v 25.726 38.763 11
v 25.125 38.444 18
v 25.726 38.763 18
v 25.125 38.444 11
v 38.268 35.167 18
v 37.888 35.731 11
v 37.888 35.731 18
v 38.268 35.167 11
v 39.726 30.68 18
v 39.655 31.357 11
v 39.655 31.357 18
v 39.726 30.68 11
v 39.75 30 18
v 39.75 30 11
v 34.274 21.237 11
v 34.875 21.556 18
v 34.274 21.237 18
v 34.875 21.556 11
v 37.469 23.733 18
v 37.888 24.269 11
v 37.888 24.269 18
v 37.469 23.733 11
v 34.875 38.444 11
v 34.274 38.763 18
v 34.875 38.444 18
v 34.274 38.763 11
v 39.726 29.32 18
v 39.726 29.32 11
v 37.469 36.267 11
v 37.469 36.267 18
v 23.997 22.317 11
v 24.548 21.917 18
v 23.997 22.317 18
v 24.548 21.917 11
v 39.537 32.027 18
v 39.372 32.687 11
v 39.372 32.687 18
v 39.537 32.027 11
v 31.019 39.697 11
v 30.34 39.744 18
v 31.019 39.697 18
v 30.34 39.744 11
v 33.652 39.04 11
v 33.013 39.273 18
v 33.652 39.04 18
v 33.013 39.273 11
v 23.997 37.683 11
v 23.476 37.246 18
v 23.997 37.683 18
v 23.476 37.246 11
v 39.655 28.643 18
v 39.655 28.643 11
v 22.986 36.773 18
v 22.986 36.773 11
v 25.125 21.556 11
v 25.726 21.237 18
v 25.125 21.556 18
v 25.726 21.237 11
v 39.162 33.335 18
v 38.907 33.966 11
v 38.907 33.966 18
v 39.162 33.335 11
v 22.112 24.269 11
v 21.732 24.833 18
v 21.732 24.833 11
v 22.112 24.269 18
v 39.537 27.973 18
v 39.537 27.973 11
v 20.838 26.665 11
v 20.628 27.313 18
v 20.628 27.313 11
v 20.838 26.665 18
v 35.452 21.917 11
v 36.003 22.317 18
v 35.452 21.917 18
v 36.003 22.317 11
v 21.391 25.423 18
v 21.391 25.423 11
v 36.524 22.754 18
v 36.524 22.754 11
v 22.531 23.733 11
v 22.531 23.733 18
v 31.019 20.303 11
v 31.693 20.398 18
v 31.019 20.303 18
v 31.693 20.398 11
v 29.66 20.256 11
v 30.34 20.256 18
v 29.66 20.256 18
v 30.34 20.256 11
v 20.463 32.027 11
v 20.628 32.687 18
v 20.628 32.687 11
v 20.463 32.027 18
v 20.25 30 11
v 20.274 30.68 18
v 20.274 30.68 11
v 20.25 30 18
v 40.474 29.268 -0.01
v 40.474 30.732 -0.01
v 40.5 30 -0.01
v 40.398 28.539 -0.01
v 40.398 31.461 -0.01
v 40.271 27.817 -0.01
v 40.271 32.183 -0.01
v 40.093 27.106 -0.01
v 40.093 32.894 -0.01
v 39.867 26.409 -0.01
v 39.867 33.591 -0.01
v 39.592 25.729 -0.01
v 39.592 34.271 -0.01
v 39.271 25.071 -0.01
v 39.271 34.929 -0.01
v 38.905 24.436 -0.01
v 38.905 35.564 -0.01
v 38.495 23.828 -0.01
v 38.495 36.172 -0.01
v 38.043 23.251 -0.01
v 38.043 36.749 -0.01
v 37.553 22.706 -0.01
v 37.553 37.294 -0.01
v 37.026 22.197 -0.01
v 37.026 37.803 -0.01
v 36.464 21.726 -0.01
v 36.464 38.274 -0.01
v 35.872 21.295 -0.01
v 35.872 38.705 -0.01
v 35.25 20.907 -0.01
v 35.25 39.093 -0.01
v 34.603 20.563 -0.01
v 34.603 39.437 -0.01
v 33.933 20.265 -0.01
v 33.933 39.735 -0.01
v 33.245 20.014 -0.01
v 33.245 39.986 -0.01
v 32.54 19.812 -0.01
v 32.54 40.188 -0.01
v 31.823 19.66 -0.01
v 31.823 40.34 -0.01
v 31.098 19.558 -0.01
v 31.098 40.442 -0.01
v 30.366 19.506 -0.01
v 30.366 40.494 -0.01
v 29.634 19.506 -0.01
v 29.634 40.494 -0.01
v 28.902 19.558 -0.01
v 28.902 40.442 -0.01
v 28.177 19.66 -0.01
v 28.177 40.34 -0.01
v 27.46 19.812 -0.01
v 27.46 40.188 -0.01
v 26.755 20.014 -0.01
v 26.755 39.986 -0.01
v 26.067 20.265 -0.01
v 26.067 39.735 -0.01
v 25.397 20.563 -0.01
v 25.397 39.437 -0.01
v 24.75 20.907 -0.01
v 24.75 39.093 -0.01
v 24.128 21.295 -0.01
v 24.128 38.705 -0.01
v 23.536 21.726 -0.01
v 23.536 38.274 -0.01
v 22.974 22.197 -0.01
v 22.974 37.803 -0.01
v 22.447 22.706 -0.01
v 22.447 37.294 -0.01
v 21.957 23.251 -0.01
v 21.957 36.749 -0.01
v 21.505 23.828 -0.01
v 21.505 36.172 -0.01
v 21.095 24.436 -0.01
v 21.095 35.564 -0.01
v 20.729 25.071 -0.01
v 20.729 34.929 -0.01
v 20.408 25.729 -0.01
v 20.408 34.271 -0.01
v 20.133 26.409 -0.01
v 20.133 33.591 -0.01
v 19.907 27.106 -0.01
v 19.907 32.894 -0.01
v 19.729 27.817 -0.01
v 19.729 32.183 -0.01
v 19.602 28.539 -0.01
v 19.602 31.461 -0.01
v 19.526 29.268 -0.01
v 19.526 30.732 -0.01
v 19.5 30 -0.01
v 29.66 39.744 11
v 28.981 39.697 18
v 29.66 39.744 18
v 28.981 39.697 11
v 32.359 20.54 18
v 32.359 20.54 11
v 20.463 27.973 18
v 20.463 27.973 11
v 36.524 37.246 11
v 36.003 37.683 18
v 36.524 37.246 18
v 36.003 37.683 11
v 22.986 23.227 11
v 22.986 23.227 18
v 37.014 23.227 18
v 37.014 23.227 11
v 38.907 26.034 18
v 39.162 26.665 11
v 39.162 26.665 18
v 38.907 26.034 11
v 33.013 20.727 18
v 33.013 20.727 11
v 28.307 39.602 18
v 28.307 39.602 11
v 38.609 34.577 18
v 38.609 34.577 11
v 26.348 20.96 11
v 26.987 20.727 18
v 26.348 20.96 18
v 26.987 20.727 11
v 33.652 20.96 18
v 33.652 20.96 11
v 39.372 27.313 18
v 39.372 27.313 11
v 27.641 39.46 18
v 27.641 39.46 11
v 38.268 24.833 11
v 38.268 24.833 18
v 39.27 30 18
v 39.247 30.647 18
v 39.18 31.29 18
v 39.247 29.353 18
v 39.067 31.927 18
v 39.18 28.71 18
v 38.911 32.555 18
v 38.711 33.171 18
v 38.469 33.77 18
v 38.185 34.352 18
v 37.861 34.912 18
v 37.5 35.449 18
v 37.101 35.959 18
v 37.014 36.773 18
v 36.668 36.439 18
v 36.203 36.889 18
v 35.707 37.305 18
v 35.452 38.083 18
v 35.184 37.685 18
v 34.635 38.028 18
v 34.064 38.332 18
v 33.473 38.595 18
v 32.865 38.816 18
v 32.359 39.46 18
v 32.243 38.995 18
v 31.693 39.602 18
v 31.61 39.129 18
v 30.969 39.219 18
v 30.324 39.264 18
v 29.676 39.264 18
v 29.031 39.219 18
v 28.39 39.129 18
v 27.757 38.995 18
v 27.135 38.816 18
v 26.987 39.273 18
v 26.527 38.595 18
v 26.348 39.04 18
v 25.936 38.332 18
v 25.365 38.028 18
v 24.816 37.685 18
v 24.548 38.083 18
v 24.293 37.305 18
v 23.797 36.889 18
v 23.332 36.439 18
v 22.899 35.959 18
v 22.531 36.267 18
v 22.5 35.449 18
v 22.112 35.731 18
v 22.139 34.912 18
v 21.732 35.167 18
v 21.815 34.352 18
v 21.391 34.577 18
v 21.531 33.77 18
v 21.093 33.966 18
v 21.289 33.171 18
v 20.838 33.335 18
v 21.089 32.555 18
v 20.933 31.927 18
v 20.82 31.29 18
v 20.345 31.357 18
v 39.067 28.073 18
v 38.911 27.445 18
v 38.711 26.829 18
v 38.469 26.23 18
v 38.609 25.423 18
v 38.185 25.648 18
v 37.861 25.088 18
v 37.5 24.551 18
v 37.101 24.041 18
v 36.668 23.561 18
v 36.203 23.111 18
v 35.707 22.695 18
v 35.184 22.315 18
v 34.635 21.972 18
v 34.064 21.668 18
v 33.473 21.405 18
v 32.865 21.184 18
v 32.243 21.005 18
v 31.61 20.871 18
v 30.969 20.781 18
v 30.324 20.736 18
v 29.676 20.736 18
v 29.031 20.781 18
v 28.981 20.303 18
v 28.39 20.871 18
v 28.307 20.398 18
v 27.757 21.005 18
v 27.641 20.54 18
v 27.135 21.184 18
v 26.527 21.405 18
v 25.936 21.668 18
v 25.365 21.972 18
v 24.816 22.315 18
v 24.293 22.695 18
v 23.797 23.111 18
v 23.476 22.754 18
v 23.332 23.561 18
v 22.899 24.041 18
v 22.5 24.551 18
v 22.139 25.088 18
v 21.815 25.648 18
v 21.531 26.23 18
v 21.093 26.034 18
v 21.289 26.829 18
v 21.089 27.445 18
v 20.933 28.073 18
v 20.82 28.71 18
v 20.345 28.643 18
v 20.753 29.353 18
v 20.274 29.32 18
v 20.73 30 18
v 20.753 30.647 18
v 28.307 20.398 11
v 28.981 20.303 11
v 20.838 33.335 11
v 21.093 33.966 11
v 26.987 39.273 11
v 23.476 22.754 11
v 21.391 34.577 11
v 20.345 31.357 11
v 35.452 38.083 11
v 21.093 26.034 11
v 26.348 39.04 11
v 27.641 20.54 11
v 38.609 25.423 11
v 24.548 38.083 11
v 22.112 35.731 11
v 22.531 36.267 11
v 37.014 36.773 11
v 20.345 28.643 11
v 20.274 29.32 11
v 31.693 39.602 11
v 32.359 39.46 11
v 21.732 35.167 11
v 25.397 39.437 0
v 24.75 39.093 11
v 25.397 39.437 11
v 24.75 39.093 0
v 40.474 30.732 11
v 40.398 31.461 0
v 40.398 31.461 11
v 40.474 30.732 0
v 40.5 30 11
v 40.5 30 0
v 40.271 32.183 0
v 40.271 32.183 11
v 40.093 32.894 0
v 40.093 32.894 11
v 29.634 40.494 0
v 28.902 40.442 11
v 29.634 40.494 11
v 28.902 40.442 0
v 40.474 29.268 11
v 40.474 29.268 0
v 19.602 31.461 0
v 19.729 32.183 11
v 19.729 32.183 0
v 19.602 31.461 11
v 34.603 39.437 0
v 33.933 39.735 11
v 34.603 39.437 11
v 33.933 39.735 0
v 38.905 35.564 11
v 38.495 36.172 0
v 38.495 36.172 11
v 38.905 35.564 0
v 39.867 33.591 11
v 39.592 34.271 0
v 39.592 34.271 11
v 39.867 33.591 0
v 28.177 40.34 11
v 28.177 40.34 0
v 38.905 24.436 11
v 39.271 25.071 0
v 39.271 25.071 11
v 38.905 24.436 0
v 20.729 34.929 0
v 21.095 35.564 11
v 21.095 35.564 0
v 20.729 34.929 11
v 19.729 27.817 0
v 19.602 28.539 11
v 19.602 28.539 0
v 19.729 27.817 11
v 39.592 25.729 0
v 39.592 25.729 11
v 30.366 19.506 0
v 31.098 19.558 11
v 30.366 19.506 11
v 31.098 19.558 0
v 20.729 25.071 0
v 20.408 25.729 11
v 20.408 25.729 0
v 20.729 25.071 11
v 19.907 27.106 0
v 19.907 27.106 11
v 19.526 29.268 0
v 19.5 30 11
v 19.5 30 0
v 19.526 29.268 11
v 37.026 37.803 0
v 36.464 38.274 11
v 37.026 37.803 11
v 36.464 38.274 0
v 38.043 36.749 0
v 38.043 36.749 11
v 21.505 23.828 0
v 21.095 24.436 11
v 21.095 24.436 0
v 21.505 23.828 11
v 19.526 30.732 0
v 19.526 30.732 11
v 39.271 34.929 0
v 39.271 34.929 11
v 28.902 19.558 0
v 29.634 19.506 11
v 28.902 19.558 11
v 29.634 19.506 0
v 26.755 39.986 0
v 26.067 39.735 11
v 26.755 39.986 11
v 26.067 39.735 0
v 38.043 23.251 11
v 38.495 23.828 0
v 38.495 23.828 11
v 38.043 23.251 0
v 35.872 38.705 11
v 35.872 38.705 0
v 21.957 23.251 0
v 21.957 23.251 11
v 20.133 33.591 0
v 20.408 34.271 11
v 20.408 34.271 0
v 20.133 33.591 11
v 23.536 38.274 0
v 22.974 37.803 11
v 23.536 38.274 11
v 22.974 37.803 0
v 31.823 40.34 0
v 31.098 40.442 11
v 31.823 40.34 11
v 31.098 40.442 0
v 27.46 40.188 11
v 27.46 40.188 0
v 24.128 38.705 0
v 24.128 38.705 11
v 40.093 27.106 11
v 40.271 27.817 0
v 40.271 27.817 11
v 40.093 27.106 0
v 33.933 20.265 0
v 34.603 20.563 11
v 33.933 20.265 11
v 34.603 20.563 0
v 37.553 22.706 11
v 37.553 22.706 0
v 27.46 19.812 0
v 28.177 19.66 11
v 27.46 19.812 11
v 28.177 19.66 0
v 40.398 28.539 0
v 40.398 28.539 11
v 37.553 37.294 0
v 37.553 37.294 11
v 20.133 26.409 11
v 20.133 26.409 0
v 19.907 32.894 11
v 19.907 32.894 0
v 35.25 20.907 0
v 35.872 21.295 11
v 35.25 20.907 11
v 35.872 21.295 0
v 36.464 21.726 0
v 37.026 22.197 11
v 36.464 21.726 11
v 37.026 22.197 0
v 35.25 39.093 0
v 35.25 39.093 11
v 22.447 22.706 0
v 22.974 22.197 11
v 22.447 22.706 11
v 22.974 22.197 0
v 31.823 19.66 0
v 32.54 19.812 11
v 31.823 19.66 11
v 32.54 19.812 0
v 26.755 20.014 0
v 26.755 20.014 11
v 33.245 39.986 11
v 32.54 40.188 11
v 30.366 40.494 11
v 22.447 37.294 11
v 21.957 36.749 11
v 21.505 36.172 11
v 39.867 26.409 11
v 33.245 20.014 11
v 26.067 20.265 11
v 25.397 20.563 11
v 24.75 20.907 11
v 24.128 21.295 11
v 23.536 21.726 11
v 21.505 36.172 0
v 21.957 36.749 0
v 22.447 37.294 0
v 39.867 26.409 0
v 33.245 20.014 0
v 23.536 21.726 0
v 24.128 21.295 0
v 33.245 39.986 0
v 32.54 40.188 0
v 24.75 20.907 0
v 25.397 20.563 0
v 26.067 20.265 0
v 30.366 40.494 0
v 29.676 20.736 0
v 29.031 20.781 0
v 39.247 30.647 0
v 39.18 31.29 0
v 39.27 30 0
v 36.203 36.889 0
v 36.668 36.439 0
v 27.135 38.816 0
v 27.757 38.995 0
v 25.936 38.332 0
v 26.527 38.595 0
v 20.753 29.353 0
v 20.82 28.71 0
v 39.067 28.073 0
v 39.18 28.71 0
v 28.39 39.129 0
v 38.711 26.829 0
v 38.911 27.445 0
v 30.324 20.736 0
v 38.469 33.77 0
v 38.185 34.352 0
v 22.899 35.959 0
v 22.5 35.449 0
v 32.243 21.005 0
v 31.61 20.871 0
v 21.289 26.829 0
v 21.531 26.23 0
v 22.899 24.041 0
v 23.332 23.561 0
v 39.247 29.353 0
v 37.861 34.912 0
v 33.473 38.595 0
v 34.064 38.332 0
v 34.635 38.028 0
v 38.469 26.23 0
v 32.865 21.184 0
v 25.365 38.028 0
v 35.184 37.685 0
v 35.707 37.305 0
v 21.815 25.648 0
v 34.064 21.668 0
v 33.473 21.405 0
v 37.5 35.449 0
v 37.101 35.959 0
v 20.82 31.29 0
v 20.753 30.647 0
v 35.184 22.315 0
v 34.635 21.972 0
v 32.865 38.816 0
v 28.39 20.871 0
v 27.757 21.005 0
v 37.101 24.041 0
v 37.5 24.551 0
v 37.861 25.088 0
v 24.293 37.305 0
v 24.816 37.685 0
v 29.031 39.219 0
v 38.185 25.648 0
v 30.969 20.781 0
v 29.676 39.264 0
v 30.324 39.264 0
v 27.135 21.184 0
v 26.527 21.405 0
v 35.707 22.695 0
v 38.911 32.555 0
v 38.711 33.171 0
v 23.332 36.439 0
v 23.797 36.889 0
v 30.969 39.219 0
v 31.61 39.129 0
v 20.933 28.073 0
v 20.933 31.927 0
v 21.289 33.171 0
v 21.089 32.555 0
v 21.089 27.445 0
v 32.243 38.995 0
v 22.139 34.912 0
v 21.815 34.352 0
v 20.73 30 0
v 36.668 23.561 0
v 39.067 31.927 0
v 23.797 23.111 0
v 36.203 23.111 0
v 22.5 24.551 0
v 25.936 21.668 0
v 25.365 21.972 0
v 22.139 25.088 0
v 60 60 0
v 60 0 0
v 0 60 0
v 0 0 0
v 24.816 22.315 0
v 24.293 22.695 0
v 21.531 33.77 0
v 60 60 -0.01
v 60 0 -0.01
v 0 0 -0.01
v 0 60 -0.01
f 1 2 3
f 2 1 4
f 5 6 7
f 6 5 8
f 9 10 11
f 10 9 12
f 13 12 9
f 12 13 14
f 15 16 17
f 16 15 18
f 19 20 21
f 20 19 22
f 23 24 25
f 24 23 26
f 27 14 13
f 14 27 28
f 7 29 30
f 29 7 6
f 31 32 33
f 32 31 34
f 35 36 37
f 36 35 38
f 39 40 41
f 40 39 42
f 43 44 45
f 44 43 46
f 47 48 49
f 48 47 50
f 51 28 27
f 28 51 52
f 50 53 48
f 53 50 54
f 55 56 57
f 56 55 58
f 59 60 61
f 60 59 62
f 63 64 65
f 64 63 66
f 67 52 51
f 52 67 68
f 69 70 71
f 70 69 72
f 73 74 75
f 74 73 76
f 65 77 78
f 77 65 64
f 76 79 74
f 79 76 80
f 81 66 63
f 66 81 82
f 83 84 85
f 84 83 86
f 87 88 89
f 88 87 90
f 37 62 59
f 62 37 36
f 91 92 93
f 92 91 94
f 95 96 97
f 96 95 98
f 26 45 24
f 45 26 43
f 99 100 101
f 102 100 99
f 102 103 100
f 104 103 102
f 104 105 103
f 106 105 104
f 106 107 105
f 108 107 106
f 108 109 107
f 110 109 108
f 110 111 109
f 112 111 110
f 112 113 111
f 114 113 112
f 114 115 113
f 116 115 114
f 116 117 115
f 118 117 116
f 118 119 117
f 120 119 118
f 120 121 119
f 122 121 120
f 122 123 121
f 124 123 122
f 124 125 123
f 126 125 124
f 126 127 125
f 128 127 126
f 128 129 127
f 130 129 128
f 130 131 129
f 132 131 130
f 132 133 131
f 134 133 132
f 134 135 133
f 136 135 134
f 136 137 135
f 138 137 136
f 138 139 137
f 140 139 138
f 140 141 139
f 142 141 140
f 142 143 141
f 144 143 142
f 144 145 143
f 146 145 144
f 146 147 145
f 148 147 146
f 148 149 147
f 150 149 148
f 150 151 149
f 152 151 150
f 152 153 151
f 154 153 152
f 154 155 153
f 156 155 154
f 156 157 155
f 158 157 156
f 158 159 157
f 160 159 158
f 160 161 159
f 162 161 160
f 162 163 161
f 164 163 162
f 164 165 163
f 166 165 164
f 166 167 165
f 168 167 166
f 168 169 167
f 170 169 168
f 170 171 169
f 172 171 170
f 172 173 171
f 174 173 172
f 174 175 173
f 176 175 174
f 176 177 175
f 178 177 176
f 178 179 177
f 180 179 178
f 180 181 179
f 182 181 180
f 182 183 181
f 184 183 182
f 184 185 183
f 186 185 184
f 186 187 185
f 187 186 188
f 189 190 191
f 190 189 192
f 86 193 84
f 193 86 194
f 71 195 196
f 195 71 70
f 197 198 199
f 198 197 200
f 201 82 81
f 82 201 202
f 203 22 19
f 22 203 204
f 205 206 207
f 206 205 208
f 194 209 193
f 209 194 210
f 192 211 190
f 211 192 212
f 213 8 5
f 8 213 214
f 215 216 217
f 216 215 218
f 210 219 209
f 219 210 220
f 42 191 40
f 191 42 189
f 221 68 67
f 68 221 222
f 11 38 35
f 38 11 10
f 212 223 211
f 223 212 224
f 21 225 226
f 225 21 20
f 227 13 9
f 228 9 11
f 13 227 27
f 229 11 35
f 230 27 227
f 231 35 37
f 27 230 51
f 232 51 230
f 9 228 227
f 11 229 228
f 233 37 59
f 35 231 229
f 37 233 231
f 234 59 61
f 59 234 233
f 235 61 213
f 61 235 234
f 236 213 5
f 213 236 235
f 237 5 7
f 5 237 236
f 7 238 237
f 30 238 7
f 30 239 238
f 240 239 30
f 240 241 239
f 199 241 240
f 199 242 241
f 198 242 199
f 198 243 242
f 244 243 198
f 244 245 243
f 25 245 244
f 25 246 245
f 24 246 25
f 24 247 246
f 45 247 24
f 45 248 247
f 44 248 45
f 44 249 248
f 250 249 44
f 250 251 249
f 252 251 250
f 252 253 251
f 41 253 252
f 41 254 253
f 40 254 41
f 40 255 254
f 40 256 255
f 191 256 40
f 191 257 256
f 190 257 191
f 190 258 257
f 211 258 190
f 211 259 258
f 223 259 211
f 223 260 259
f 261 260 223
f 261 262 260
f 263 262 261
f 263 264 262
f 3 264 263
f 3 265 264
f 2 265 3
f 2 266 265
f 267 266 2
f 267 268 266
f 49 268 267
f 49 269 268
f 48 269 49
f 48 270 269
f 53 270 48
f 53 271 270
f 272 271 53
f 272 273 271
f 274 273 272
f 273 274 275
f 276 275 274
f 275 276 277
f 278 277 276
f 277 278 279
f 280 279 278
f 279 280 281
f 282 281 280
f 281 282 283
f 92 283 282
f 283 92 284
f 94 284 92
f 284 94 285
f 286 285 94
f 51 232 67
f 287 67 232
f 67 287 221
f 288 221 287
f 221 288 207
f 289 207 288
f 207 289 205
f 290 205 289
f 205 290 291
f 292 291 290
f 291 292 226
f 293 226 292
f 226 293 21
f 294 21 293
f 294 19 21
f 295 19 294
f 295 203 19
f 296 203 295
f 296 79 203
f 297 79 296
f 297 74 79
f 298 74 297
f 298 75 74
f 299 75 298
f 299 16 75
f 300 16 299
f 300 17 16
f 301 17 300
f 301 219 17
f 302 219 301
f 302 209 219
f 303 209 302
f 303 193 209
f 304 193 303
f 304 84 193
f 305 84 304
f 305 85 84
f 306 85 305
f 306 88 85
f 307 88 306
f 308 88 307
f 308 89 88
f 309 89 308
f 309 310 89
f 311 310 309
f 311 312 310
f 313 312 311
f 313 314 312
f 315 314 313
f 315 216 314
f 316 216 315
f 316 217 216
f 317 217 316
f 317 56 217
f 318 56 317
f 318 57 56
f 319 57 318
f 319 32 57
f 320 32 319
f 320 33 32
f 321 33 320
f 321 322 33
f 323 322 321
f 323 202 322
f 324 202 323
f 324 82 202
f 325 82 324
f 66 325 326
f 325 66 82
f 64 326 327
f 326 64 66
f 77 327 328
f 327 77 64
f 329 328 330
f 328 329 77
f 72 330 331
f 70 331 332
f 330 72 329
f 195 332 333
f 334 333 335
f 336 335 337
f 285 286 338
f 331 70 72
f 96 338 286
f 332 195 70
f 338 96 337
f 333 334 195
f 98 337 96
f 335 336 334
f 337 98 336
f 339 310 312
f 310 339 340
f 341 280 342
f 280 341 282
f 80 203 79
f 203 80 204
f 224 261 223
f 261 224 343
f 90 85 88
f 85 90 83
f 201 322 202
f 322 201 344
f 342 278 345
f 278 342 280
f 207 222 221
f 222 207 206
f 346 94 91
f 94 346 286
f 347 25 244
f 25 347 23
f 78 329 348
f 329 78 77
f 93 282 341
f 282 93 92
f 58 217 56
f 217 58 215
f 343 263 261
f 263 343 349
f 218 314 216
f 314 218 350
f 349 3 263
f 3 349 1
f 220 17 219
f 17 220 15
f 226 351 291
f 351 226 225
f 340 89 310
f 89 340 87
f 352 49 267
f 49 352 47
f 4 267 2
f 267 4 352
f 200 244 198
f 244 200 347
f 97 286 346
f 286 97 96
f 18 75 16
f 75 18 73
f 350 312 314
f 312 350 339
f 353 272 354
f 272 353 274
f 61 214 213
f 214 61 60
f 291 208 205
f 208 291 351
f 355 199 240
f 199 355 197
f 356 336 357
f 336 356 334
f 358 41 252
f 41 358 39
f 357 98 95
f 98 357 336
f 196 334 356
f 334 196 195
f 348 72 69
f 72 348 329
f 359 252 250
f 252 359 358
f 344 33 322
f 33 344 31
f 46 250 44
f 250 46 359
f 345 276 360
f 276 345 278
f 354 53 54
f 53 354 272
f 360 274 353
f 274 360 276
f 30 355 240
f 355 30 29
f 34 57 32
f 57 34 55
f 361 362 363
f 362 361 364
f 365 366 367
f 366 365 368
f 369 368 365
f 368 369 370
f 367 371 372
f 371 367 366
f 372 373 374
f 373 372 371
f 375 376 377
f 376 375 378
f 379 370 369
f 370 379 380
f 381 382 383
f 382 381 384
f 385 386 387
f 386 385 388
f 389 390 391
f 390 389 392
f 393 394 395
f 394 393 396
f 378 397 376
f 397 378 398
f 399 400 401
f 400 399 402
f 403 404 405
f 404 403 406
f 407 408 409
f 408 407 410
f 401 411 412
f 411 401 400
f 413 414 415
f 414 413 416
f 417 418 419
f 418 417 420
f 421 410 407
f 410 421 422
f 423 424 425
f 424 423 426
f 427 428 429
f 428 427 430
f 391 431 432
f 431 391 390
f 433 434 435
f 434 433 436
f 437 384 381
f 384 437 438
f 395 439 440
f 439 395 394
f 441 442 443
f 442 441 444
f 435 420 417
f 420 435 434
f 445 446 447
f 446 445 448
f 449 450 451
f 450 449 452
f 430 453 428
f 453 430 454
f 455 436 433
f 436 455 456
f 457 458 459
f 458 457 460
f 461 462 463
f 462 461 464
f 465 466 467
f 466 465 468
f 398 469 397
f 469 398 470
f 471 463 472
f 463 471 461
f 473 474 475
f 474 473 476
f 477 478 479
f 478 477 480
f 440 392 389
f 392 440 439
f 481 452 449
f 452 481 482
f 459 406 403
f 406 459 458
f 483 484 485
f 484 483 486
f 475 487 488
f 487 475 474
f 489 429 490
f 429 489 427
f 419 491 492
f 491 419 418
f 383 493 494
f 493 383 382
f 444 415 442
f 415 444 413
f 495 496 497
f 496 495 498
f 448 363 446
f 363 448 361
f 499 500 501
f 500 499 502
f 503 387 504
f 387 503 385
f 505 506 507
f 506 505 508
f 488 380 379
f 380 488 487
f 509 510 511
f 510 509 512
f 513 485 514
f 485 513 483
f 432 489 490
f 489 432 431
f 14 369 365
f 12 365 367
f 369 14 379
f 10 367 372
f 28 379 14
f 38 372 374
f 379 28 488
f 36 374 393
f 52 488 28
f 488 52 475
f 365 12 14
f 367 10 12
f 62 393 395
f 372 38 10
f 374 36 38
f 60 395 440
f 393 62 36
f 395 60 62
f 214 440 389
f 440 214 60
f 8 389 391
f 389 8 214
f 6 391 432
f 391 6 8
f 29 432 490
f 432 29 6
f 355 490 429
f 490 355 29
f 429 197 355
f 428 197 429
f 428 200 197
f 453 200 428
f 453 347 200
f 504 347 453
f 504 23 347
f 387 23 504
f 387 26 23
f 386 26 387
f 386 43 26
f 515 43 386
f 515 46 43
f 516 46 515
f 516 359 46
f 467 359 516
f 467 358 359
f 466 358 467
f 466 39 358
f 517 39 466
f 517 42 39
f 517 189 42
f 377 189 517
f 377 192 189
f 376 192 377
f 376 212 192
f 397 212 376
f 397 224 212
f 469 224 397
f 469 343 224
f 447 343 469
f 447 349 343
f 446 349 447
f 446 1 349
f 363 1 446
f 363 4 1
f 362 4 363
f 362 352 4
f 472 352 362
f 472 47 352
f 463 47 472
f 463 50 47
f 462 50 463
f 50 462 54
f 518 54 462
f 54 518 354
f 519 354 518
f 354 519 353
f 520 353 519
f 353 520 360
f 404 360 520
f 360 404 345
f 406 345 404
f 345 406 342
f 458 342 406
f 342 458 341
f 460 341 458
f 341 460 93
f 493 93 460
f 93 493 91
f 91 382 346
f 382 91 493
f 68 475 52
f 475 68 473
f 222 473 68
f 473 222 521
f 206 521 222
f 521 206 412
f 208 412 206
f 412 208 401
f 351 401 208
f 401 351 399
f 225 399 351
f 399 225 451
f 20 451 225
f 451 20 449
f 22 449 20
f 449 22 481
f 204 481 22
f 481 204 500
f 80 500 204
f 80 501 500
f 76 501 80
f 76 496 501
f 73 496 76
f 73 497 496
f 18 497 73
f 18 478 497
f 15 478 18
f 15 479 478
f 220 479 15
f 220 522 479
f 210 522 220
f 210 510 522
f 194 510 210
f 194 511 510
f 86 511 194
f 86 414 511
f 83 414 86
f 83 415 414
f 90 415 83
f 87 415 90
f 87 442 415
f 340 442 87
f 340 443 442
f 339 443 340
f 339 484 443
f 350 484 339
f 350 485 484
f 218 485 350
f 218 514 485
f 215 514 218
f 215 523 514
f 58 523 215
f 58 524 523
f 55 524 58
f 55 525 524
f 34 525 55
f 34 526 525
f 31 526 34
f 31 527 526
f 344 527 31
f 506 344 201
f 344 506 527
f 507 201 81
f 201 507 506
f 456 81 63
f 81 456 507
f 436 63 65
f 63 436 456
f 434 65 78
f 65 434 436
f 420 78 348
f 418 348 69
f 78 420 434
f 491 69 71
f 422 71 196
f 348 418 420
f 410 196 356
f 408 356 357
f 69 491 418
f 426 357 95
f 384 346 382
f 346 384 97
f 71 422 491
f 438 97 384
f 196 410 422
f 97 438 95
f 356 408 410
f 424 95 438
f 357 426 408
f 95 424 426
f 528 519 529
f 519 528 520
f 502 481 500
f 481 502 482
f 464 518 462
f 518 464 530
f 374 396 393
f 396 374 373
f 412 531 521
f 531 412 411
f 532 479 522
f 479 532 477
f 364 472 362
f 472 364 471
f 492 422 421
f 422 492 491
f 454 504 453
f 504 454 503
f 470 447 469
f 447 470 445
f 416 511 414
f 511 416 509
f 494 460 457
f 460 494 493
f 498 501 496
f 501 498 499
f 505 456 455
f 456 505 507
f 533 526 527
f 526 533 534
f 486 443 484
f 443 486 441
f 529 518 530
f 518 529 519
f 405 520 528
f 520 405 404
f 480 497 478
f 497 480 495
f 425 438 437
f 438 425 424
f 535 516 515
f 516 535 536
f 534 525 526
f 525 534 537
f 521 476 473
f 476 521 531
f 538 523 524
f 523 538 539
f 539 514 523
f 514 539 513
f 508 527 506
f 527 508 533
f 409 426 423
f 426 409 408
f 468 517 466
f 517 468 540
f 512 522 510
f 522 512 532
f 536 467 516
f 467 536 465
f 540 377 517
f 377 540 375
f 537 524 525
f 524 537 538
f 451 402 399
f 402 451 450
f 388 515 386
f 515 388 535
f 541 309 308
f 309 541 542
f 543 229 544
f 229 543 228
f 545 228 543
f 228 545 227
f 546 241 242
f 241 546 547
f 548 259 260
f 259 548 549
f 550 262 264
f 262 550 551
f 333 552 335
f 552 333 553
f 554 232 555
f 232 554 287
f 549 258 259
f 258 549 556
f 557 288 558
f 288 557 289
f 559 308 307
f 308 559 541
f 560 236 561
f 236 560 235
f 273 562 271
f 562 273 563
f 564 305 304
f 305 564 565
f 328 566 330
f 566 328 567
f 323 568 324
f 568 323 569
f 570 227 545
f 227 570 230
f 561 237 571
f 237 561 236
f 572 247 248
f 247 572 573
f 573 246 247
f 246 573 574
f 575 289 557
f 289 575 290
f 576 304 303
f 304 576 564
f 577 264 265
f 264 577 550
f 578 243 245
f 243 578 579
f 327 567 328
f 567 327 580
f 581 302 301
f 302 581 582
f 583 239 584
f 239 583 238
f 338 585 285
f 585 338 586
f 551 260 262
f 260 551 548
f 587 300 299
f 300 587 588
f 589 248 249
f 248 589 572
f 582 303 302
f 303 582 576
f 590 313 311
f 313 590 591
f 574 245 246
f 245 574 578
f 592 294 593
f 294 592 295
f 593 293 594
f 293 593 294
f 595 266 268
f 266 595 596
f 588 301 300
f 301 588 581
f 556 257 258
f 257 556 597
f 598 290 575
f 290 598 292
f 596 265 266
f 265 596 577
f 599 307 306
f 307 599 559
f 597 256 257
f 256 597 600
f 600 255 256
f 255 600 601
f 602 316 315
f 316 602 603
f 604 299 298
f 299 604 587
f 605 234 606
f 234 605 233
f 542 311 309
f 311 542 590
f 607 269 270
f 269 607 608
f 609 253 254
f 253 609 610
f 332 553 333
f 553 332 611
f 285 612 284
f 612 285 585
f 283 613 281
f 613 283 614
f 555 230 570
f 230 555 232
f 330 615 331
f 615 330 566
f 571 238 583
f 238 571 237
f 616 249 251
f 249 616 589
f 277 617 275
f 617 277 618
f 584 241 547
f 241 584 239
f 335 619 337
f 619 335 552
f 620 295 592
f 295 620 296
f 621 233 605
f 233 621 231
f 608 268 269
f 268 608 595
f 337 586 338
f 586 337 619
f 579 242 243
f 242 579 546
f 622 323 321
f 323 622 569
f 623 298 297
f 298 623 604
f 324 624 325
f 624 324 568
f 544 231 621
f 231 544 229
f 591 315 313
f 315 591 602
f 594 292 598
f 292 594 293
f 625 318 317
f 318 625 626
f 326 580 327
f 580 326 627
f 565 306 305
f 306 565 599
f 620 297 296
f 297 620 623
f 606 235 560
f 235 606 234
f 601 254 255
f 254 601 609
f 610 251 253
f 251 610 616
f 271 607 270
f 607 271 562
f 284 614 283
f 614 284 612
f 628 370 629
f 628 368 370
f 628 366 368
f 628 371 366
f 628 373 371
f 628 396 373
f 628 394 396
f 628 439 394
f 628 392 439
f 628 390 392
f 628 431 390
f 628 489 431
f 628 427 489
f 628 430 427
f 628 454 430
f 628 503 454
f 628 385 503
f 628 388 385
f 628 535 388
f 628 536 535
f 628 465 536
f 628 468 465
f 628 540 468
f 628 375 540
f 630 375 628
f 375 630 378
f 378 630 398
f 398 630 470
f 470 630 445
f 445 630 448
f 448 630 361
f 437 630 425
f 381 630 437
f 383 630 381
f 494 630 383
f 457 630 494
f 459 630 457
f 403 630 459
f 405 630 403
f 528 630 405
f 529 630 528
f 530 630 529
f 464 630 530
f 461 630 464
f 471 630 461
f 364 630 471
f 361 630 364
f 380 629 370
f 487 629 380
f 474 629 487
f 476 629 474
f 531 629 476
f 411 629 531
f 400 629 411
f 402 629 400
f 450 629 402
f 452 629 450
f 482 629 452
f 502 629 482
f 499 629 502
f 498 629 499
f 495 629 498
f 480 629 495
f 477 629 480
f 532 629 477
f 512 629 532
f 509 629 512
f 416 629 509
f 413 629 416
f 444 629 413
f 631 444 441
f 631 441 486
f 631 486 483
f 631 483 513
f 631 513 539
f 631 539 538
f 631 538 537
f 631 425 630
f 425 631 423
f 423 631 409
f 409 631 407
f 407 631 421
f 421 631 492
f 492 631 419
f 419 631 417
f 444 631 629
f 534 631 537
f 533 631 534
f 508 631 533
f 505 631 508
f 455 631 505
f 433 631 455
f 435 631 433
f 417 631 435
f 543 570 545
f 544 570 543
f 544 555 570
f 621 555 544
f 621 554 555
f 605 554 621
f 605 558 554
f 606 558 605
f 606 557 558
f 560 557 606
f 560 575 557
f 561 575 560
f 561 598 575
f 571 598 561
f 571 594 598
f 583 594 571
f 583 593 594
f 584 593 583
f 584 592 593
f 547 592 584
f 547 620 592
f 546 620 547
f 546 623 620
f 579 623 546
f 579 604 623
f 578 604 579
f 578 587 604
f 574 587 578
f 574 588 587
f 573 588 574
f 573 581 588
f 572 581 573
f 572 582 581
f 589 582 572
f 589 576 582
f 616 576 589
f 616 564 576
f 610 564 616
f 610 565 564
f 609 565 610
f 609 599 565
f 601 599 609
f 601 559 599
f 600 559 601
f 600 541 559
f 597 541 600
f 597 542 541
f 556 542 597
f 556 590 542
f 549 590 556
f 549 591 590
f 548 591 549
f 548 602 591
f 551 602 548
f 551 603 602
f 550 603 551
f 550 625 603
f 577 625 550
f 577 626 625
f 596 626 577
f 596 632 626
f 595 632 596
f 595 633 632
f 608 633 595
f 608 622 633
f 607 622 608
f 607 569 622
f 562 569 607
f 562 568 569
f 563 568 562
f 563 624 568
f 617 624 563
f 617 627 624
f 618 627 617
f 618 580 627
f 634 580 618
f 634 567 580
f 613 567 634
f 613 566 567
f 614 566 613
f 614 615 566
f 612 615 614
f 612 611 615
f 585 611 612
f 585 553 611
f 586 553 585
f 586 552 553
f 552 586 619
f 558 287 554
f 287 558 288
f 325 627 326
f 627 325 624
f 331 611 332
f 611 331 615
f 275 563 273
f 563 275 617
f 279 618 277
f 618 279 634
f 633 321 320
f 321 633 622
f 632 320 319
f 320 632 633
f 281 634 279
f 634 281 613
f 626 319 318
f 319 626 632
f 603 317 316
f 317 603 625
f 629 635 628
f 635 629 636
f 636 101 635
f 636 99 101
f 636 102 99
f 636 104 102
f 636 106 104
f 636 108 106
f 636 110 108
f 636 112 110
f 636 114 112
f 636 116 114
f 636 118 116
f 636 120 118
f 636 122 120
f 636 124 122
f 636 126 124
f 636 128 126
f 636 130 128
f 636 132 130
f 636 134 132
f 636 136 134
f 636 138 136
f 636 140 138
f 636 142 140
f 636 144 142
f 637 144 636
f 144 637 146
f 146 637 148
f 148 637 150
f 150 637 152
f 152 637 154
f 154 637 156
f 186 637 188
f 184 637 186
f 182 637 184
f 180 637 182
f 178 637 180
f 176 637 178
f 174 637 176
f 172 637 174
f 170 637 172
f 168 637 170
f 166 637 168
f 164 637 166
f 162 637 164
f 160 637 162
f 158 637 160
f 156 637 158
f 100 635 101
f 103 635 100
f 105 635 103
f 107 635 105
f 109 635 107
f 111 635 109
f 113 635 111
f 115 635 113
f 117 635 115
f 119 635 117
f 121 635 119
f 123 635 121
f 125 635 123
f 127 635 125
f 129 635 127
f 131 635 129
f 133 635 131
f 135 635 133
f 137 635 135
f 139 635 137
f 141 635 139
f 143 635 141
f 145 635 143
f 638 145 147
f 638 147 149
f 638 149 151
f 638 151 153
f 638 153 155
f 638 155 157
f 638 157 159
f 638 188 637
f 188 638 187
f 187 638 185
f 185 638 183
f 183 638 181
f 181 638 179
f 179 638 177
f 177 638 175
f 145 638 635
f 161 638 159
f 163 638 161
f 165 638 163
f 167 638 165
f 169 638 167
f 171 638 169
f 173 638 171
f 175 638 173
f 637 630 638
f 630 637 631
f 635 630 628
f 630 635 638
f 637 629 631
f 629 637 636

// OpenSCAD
// file: ../Base/PlacementOptions.scad
// Fischertechnik Box Foundation
// Placement Options

// Alignment
NoAlign = 0;
AlignLeft = 1;
AlignBottom = 2;
AlignCenter = 3;
AlignRight = 4;
AlignTop = 5;

// Element rotation degree steps
rotations = [0, -90, -180, -270];

// Rotation
NoRotation = 0;
Rotate0 = 0;
Rotate90 = 1;
Rotate180 = 2;
Rotate270 = 3;

// Docking (seen from above)
NoDock = -1;
DockLeft = 0;
DockTop = 1;
DockRight = 2;
DockCorner = 2;
DockBottom = 3;

// Web corners
LowerLeft = 0;
UpperLeft = 1;
UpperRight = 2;
LowerRight = 3;

// Web position relative to corner
LeftOfCorner = 0;
RightOfCorner = 1;

// Rails direction
Horizontal = true;
Vertical = false;
// file: ../Base/Boxes.scad
// Fischertechnik Box Foundation
// Pre-designed Boxes

use <Constants.scad>

include <PlacementOptions.scad>

box190Width = 190;
box190Depth = 130;
box130Width = 130;
box130Depth = 95;

// Values are from an original ec3 box
topBottomDifference = 1.5;
outerHeight = 40;
baseThickness = 1.8;
innerHeight = outerHeight - baseThickness;
stackExcess = 5.7;
radius = 3.5;
wallThickness = 1.5;
tolerance = 0.2;

boxWallThickness = wallThickness;
boxBaseThickness = baseThickness;
boxWebWidth = 3.0;

// getBoxWallThickness()
// Gets the wall thickness of a Fischertechnik Box
function getBoxWallThickness() = boxWallThickness;

// getBoxUsageHeight(height = 38.2)
// Gets the usable height of a Fischertechnik box
// height = Outer height of the box from the bottom to the upper edge.
function getBoxUsageHeight(height = outerHeight) = height - baseThickness - stackExcess;

// getBoxInnerHeight()
// Gets the inner height of a Fischertechnik box, including the stack excess
function getBoxInnerHeight() = innerHeight;

// getBoxBaseThickness()
// Gets the thickness of the Fischertechnik box base.
function getBoxBaseThickness() = boxBaseThickness;

// getBoxWebWidth()
// Gets the width of a box web
function getBoxWebWidth() = boxWebWidth;

// getBox190Space()
// Gets the usable inner space of a Box 190 as an x/y-list
function getBox190Space() = [
    box190Width - 2*getBoxWallThickness() - topBottomDifference, 
    box190Depth - 2*getBoxWallThickness() - topBottomDifference ];

// RoundedCornerPlate(width, depth, height, radius)
// Creates a body plate with rounded corners for a box. Used
// also to create the complete box with the hull module.
// width = Width of the plate
// depth = depth of the plate 
// height = thickness of the plate
// radius = radius of the rounded corner
module RoundedCornerPlate(width, depth, height, radius) {
    translate([radius, radius])
    hull() {
        w = width-2*radius;
        d = depth-2*radius;
        cube([w, d, height]);
        cylinder(height, r=radius, $fn=getFragments());
        translate([w, 0])
            cylinder(height, r=radius, $fn=getFragments());
        translate([w, d])
            cylinder(height, r=radius, $fn=getFragments());
        translate([0, d])
            cylinder(height, r=radius, $fn=getFragments());
    }
}

// BoxBase(width, depth)
// Creates an empty stackable Fischertechnik compatible box
// width = Outer width of the box (190, 130, ...)
// depth = Outer depth of the box (130, 95, ...)

module BoxBase(width, depth, height=outerHeight) {    
    thinPlate = 0.01;

    innerHeight = height - baseThickness;    
    
    module Body(tolerance=tolerance) {
        hull() {
            // Bottom with tolerance to fit into the original boxes when stacked
            translate([-wallThickness+tolerance, -wallThickness+tolerance, -baseThickness])
                RoundedCornerPlate(width-topBottomDifference-2*tolerance, depth-topBottomDifference-2*tolerance, thinPlate, radius);
            
            // Top
            translate([-wallThickness-topBottomDifference/2, -wallThickness-topBottomDifference/2, innerHeight-thinPlate])
                RoundedCornerPlate(width, depth, thinPlate, radius);
         }
    }

    module Cutoff() {
        hull() {
            coWidth = width - 2*wallThickness;
            coDepth = depth - 2*wallThickness;
            
            // Bottom
            RoundedCornerPlate(coWidth-topBottomDifference, coDepth-topBottomDifference, thinPlate, radius);

            // Top
            translate([-topBottomDifference/2, -topBottomDifference/2, innerHeight+thinPlate]) 
                RoundedCornerPlate(coWidth, coDepth, thinPlate, radius);
        }
    }
    
    difference() {        
        Body();
        Cutoff();
        stackOffset = innerHeight - stackExcess;
        translate([0, 0, stackOffset + baseThickness])
            Body(tolerance=0);
    }
}

// Creates the Fischertechnik empty box 130x190 mm and places it at position 0,0
// 190x130 are the outer sizes, the inner space is slightly smaller. Use getBox190Space() to get the inner sizes.
// The box is positioned that the usable inner space is at the 0,0,0 position.

module Box190() {
    BoxBase(box190Width, box190Depth);
}

// Gets the usable inner space of a Box 130 as an x/y-list
function getBox130Space() = [
    box130Width - 2*getBoxWallThickness() - topBottomDifference, 
    box130Depth - 2*getBoxWallThickness() - topBottomDifference ];

// Creates the Fischertechnik empty box 95x130 mm and places it at position 0,0
// 190x130 are the outer sizes, the inner space is slightly smaller. Use getBox190Space() to get the inner sizes.
// The box is positioned that the usable inner space is at the 0,0,0 position.

module Box130() {
    BoxBase(box130Width, box130Depth);
}

// Creates a web at the specified box walls
// corner 0 = LowerLeft, 1 = UpperLeft, 2 = UpperRight, 3 = LowerRight
// side 0 = LeftOfCorner, 1 = RightOfCorner
// distance = Distance in mm from the corner
// boxSpace = inner width and depth of the box (default: Box 190)
// webWidth = length of the web (default is 3 mms)
// webThickness = thickness of the web (default is 1 mm)
// height = Height of the web (standard is getBoxUsageHeight())
// sink = How much of the web is sunk into the wall

module BoxWeb(
    corner, 
    side, 
    distance, 
    boxSpace=getBox190Space(), 
    webWidth=getBoxWebWidth(), 
    webThickness=1.0, 
    height=getBoxUsageHeight(),
    sink = getBoxWallThickness()/2) {
    width = (corner % 2 == 0) ? 
            (side == LeftOfCorner ? webWidth : webThickness) :
            (side == LeftOfCorner ? webThickness : webWidth);

    depth = (corner % 2 == 0) ? 
            (side == RightOfCorner ? webWidth : webThickness) :
            (side == RightOfCorner ? webThickness : webWidth);
    
    xDiff = corner == LowerLeft ? 
                (side == LeftOfCorner ? -sink : distance) :
            (corner == UpperLeft ?                
                (side == LeftOfCorner ? distance : -sink) :
            (corner == UpperRight ?
                (side == LeftOfCorner ? boxSpace.x-webWidth+sink : boxSpace.x-distance-webThickness) :
                (side == LeftOfCorner ? boxSpace.x-distance-webThickness: boxSpace.x-webWidth+sink)));

    yDiff = corner == LowerLeft ? 
                (side == RightOfCorner ? -sink : distance) :
            (corner == UpperLeft ?
                (side == RightOfCorner ? boxSpace.y-distance-webThickness : boxSpace.y-webWidth+sink) :
            (corner == UpperRight ?
                (side == RightOfCorner ? boxSpace.y-webWidth+sink : boxSpace.y-distance-webThickness) :
                (side == RightOfCorner ? distance : -sink)));
    
    translate([xDiff, yDiff, -getExcess()])
        cube([width, depth, height + 2*getExcess()]);
}
// file: ../Base/Rotation.scad
// Fischertechnik Box Foundation
// Geometry Helpers Rotation

include <PlacementOptions.scad>

// getRotatedSpace(space, rotation=NoRotation)
// Rotates the space dependent on the specified rotation

function getRotatedSpace(space, rotation=NoRotation) = [
    (rotation == Rotate90 || rotation == Rotate270) ? space.y : space.x,
    (rotation == Rotate90 || rotation == Rotate270) ? space.x : space.y
];

// Rotates the given space around the fixed left lower corner
// space = the space the children needs as width/depth list [width,depth]
// rotation = 0 Rotate0 degrees, 1 Rotate90 degrees, 2 Rotate180 degrees, 3 Rotate270 degrees (equivalent to -90)

module RotateFix(space, rotation=NoRotation) {
    dy = (rotation == Rotate0 || rotation == Rotate270) ? 0 :
        (rotation == Rotate90) ? space.x :
        space.y;
    dx = (rotation < Rotate180) ? 0 :
        (rotation == Rotate180) ? space.x :
        space.y;
    
    translate([dx, dy, 0])
        rotate([0, 0, rotations[rotation]])
            children();
}
// file: ../Base/Alignment.scad
// Fischertechnik Box Foundation
// Geometry Helpers Alignment

include <PlacementOptions.scad>

// getAlignedX(elementWidth, spaceWidth, align=AlignRight, offset=0)
// Gets the aligned X offset of an element with the given
// width in the given space.
// elementWidth = The width of the element to positon
// spaceWidth = The space where the element should be aligned
// align = 0 AlignLeft, 1 AlignCenter, 2 AlignRight
// offset = an optional offset from the aligned position. When
// aligned left or centered, then positive values are in X direction.
// When aligned right then positive values are in negative X direction.

function getAlignedX(elementWidth, spaceWidth, align=AlignRight, offset=0) =
    (align == AlignLeft) ?
        offset :
        ((align == AlignCenter) ?
        (spaceWidth - elementWidth)/2 + offset :
        spaceWidth - offset - elementWidth);

// getAlignedY(elementDepth, spaceDepth, align=AlignTop, offset=0)
// Gets the aligned Y offset of an element with the given
// depth in the given space.
// elementDepth = The depth of the element to positon
// spaceDepth = The space where the element should be aligned
// align = 0 AlignBottom, 1 AlignCenter, 2 AlignTop
// offset = an optional offset from the aligned position. When
// aligned bottom or centered, then positive values are in Y direction.
// When aligned top then positive values are in negative Y direction.

function getAlignedY(elementDepth, spaceDepth, align=AlignTop, offset=0) =
    (align == AlignBottom) ?
        offset :
        ((align == AlignCenter) ?
        (spaceDepth - elementDepth)/2 + offset :
        spaceDepth - offset - elementDepth);
// file: ../Base/Placement.scad
// Fischertechnik Box Foundation
// Geometry Helpers Placement

use <Constants.scad>
use <Alignment.scad>
use <Rotation.scad>
use <Boxes.scad>

include <PlacementOptions.scad>

// Place(x=0, y=0, elementSpace=[0,0], alignX=AlignLeft, alignY=AlignBottom, rotation=Rotate0, boxSpace=getBox190Space())
// Places the child at the specified position
// y = Y-Position. This is a relative position when an X aligment is specified.
// x = X-Position. This is a relative position when an Y aligment is specified.
// elementSpace = space of the element to be placed [x,y]
// alignX = -1=NoAlign, 0 AlignLeft, 1 AlignCenter, 3 AlignRight (elementSpace and boxSpace required!)
// alignY = -1=NoAlign, 2 AlignBottom, 1 AlignCenter, 4 AlignTop (elementSpace and boxSpace required!)
// rotation = 0 Rotate0 0 degrees, 1 Rotate90 90 degrees, 
// 2 Rotate180 180 degrees, 3 Rotate270 270 degrees (equivalent to -90)
// boxSpace = Inner space of the box where the placement occurs [x,y] - default is Box 190x130 inner space

module Place(x=0, y=0, elementSpace=[0,0], 
  alignX=AlignLeft, alignY=AlignBottom, 
  rotation=NoRotation, boxSpace=getBox190Space()) {

    module Position(x, y, space, rotation=Rotate0) {
        translate([x, y, 0])
            RotateFix(space, rotation)
                children();
    }

    space = getRotatedSpace(elementSpace, rotation);
    alignedX = getAlignedX(space.x, boxSpace.x, alignX, x);
    alignedY = getAlignedY(space.y, boxSpace.y, alignY, y);
    Position(alignedX, alignedY, elementSpace, rotation)
        children();
}

// Center(space=getBox130Space(), elementSpace=[0,0])
// space = Space where the children is centered. For cylinder use centered=true and no elementSpace.
// elementSpace = space of the element to be centered [x,y]

module Center(space=getBox190Space(), elementSpace=[0,0]) {
    Place(elementSpace=elementSpace, boxSpace=space, alignX=AlignCenter, alignY=AlignCenter)
        children();
}

// CenterHorizontal(width=0, y=0, offset=0, space=getBox130Space())
// width = Width of the element to be placed.
// y = Y position of the element
// offset = Offset from the center position (negative will be left of the center)
// space = Space where the element is placed

module CenterHorizontal(width=0, y=0, offset=0, space=getBox190Space()) {
    Place(x=offset, y=y, elementSpace=[width, 0], boxSpace=space, alignX=AlignCenter)
        children(0);
}

// CenterVertical(depth=0, x=0, offset=0, space=getBox130Space())
// depth = Depth of the element to be placed.
// x = X position of the element
// offset = Offset from the center position (negative will be down of the center)
// space = Space where the element is placed

module CenterVertical(depth=0, x=0, offset=0, space=getBox190Space()) {
    Place(x=x, y=offset, elementSpace=[0, depth], boxSpace=space, alignY=AlignCenter)
        children(0);
}

// getIsVertical(align)
// True if the specified alignment needs a vertical orientation for a divider (AlignRight, AlignLeft)

function getIsVertical(align) = (align == AlignRight || align == AlignLeft);

// getIsHorizontal(align)
// True if the specified alignment needs a horizontal orientation for a divider (AlignTop, AlignBottom)

function getIsHorizontal(align) = (align == AlignTop || align == AlignBottom);
// file: ../Base/Constants.scad
// Fischertechnik Box Foundation
// Constants

// Constant values necessary for multiple elements

// Base constants
dividerThickness = 1.2;
excess = 0.01;
fragments = 90;
tolerance = 0.8;

// Gets the thickness of a divider 
function getDividerThickness() = dividerThickness;

// Gets the excess that is used to merge walls into each other
function getExcess() = excess;

// Gets amount of fragments of a cylinder
function getFragments() = fragments;

// Gets the inner tolerance of a frame to each side
function getTolerance() = tolerance;


// Fischertechnik specific constants
axisDiameter = 4;
axisBottomDiameter = axisDiameter + 1;
axisTolerance = 0.2;
axisLockingLength = 8;

// Gets axis diameter of Fischertechnik axis
function getAxisDiameter() = axisDiameter;

// Gets axis diameter tolerance (subtracted for element axis)
function getAxisTolerance() = axisTolerance;

// Gets the axis diameter for standing axis
function getStandAxisDiameter() = getAxisDiameter() - getAxisTolerance();

// Gets axis bottom diameter for thicker part at the bottom
function getAxisBottomDiameter() = axisBottomDiameter;

// Gets the lengthh of the locking part of a locking axis
function getAxisLockingLength() = axisLockingLength;

pinHeight = 2.5;
pinTolerance = 0.2;

// gets the height of a connecting pin
function getPinHeight() = pinHeight;

// gets the connecting pin height tolerance
function getPinTolerance() = pinTolerance;

standardEdgeDistance = 2.5;
standardWebDistance = 11.5;
standardCornerLength = 15;

// gets the standard distance to the wall of the box for dockable frames with webs
function getStandardEdgeDistance() = standardEdgeDistance;

// gets the standard distance of each web to the corner of the dockable frame
function getStandardWebDistance() = standardWebDistance;

// gets the standard length of the corner walls of a dockable frame
function getStandardCornerLength() = standardCornerLength;

tubeWallFactor = 0.8;

// gets the wall thickness of a tube.
function getTubeWallThickness() = tubeWallFactor * getDividerThickness();

smallPartsFrameHeight = 20;

// gets the frame height for docked small parts boxes.
function getSmallPartsFrameHeight() = smallPartsFrameHeight;

hubRingDiameter = 19.5;
hubRingLevelDiameter = 21;

// gets the diameter of a tube matching the inner ring of a wheel
function getHubRingDiameter() = hubRingDiameter;

// gets the diameter of a hub tube with a thicker diameter
function getHubRingLevelDiameter() = hubRingLevelDiameter;
// main file
// Fischertechnik Box Library
// Cylinder for assembled Omni Wheel
// 183025, 183026, 183027, 183028
// CAUTION: Not for standard boxes! Use higher special Box! Wheel is 34 mms, usable height of a box is 33 mms!

use <../Base/Constants.scad>
use <../Base/Placement.scad>
use <../ModelBase/Simple.scad>

/* [Hidden] */
width = 60;
depth = 60;
height = 34;
volume = [width, depth, height];

// getCylinderOmniWheelSpece()
// Gets the space for an assembled omni wheel

function getCylinderOmniWheelSpece() = volume;

// CylinderOmniWheel()
// Cylinder for an assembled omni wheel

module CylinderOmniWheel() {
    Space(volume);

    tubeHeight = 18;
    tubeDiameter = getHubRingDiameter();
    levelheight = 11;
    levelDiameter = getHubRingLevelDiameter();;

    Center(space=volume)
        LeveledTube(tubeHeight, tubeDiameter, levelheight, levelDiameter);
}

// Test
color("lightgray")
CylinderOmniWheel();
